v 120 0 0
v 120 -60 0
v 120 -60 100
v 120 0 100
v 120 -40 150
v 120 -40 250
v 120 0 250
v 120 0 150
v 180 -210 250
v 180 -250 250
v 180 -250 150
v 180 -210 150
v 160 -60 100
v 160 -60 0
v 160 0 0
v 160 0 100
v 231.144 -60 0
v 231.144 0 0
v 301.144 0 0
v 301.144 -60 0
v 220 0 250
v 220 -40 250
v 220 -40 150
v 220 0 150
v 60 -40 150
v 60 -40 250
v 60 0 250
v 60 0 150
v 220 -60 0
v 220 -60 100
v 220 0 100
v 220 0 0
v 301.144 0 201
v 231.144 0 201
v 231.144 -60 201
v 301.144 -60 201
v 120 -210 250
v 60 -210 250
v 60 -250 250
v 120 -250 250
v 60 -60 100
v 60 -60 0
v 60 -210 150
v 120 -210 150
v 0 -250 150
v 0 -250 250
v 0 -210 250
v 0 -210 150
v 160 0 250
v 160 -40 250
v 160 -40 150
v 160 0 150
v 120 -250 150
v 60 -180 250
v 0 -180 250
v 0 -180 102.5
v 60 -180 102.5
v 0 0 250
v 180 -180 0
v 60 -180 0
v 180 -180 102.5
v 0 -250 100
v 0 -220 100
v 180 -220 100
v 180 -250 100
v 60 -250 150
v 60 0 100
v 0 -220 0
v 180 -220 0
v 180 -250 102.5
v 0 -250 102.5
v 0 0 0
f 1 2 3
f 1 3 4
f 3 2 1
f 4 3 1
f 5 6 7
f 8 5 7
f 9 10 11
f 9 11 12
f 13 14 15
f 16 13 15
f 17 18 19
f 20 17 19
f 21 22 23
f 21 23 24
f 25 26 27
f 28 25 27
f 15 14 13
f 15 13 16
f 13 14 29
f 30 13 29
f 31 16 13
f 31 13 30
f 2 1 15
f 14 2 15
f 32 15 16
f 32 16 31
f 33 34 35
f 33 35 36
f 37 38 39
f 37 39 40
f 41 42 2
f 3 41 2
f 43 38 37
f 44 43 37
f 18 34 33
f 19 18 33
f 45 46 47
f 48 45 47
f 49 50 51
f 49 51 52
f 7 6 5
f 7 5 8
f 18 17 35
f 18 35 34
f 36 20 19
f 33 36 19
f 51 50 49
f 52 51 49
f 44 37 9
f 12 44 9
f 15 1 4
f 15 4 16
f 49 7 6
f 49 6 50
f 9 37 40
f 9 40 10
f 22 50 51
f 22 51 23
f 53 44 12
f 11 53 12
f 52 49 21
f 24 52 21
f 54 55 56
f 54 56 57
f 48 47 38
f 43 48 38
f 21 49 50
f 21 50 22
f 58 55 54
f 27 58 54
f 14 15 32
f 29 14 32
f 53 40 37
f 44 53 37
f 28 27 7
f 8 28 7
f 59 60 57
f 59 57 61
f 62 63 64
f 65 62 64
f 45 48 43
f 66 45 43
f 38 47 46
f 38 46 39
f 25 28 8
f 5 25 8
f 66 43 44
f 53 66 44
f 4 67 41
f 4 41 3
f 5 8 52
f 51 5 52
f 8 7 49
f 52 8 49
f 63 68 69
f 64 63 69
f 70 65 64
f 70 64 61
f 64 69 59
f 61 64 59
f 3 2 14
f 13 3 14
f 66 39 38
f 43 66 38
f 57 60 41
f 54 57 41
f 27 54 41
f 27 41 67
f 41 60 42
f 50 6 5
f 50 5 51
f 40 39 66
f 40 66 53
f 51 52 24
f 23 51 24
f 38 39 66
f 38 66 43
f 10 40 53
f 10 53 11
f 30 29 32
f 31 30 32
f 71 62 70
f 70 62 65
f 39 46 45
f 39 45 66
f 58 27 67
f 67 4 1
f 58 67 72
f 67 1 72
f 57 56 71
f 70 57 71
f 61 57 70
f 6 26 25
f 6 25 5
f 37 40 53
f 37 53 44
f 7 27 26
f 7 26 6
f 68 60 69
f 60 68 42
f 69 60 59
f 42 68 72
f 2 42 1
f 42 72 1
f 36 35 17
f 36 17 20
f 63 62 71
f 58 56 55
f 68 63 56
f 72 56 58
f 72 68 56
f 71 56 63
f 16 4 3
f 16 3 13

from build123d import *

# Parameters (mm, degrees)
F0_W      = 70
F0_H      = 60
F1_DEPTH  = 201
F0_W_2    = 60
F2_DEPTH  = 100
F3_DEPTH  = 100
F0_W_3    = 40
F4_DEPTH  = 100
F5_DEPTH  = 250
F6_DEPTH  = 250
F0_H_2    = 40
F7_DEPTH  = 100
F8_DEPTH  = 100
F9_DEPTH  = 100
F10_W     = 180
F10_H     = 70
F11_DEPTH = 2.5
F12_W     = 60
F12_H     = 40
F13_DEPTH = 100
F14_W     = 60
F14_H     = 40
F15_DEPTH = 100
F16_W     = 60
F16_H     = 40
F17_DEPTH = 100
F18_W     = 60
F18_H     = 40
F19_DEPTH = 100
F20_W     = 40
F20_H     = 40
F21_DEPTH = 100
F22_W     = 60
F22_H     = 40
F23_DEPTH = 100


with BuildPart() as f1:
    # F0 (on Top) → F1 (new body)
    with BuildSketch(Plane.XY):
        with Locations((266.143773, -30)):
            Rectangle(F0_W, F0_H)
    extrude(amount=F1_DEPTH)


with BuildPart() as f2:
    # F0 (on Top) → F2 (new body)
    with BuildSketch(Plane.XY):
        with Locations((190, -30)):
            Rectangle(F0_W_2, F0_H)
    extrude(amount=F2_DEPTH)


with BuildPart() as f3:
    # F0 (on Top) → F3 (new body)
    with BuildSketch(Plane.XY):
        with Locations((90, -30)):
            Rectangle(F0_W_2, F0_H)
    extrude(amount=F3_DEPTH)

    # F0 (on Top) → F5 (join)
    with BuildSketch(Plane.XY):
        Polygon((60, 0), (0, 0), (0, -120), (60, -120), (60, -60), align=None)
    extrude(amount=F5_DEPTH)

    # F0 (on Top) → F6 (join)
    with BuildSketch(Plane.XY):
        with Locations((30, -150)):
            Rectangle(F0_W_2, F0_H)
    extrude(amount=F6_DEPTH)

    # F0 (on Top) → F7 (join)
    with BuildSketch(Plane.XY):
        with Locations((30, -200)):
            Rectangle(F0_W_2, F0_H_2)
    extrude(amount=F7_DEPTH)

    # F0 (on Top) → F8 (join)
    with BuildSketch(Plane.XY):
        with Locations((90, -200)):
            Rectangle(F0_W_2, F0_H_2)
    extrude(amount=F8_DEPTH)

    # F0 (on Top) → F9 (join)
    with BuildSketch(Plane.XY):
        with Locations((150, -200)):
            Rectangle(F0_W_2, F0_H_2)
    extrude(amount=F9_DEPTH)

    # F10 (on face) → F11 (join)
    with BuildSketch(Plane.XY.offset(100)):
        with Locations((90, -215)):
            Rectangle(F10_W, F10_H)
    extrude(amount=F11_DEPTH)


with BuildPart() as f4:
    # F0 (on Top) → F4 (new body)
    with BuildSketch(Plane.XY):
        with Locations((140, -30)):
            Rectangle(F0_W_3, F0_H)
    extrude(amount=F4_DEPTH)


with BuildPart() as f13:
    # F12 (on face) → F13 (new body)
    with BuildSketch(Plane.XY.offset(250)):
        with Locations((30, -230)):
            Rectangle(F12_W, F12_H)
    extrude(amount=-F13_DEPTH)


with BuildPart() as f15:
    # F14 (on face) → F15 (new body)
    with BuildSketch(Plane.XY.offset(250)):
        with Locations((90, -230)):
            Rectangle(F14_W, F14_H)
    extrude(amount=-F15_DEPTH)


with BuildPart() as f17:
    # F16 (on face) → F17 (new body)
    with BuildSketch(Plane.XY.offset(250)):
        with Locations((150, -230)):
            Rectangle(F16_W, F16_H)
    extrude(amount=-F17_DEPTH)


with BuildPart() as f19:
    # F18 (on face) → F19 (new body)
    with BuildSketch(Plane.XY.offset(250)):
        with Locations((90, -20)):
            Rectangle(F18_W, F18_H)
    extrude(amount=-F19_DEPTH)


with BuildPart() as f21:
    # F20 (on face) → F21 (new body)
    with BuildSketch(Plane.XY.offset(250)):
        with Locations((140, -20)):
            Rectangle(F20_W, F20_H)
    extrude(amount=-F21_DEPTH)


with BuildPart() as f23:
    # F22 (on face) → F23 (new body)
    with BuildSketch(Plane.XY.offset(250)):
        with Locations((190, -20)):
            Rectangle(F22_W, F22_H)
    extrude(amount=-F23_DEPTH)


solid = Compound([f1.part, f2.part, f3.part, f4.part, f13.part, f15.part, f17.part, f19.part, f21.part, f23.part])
